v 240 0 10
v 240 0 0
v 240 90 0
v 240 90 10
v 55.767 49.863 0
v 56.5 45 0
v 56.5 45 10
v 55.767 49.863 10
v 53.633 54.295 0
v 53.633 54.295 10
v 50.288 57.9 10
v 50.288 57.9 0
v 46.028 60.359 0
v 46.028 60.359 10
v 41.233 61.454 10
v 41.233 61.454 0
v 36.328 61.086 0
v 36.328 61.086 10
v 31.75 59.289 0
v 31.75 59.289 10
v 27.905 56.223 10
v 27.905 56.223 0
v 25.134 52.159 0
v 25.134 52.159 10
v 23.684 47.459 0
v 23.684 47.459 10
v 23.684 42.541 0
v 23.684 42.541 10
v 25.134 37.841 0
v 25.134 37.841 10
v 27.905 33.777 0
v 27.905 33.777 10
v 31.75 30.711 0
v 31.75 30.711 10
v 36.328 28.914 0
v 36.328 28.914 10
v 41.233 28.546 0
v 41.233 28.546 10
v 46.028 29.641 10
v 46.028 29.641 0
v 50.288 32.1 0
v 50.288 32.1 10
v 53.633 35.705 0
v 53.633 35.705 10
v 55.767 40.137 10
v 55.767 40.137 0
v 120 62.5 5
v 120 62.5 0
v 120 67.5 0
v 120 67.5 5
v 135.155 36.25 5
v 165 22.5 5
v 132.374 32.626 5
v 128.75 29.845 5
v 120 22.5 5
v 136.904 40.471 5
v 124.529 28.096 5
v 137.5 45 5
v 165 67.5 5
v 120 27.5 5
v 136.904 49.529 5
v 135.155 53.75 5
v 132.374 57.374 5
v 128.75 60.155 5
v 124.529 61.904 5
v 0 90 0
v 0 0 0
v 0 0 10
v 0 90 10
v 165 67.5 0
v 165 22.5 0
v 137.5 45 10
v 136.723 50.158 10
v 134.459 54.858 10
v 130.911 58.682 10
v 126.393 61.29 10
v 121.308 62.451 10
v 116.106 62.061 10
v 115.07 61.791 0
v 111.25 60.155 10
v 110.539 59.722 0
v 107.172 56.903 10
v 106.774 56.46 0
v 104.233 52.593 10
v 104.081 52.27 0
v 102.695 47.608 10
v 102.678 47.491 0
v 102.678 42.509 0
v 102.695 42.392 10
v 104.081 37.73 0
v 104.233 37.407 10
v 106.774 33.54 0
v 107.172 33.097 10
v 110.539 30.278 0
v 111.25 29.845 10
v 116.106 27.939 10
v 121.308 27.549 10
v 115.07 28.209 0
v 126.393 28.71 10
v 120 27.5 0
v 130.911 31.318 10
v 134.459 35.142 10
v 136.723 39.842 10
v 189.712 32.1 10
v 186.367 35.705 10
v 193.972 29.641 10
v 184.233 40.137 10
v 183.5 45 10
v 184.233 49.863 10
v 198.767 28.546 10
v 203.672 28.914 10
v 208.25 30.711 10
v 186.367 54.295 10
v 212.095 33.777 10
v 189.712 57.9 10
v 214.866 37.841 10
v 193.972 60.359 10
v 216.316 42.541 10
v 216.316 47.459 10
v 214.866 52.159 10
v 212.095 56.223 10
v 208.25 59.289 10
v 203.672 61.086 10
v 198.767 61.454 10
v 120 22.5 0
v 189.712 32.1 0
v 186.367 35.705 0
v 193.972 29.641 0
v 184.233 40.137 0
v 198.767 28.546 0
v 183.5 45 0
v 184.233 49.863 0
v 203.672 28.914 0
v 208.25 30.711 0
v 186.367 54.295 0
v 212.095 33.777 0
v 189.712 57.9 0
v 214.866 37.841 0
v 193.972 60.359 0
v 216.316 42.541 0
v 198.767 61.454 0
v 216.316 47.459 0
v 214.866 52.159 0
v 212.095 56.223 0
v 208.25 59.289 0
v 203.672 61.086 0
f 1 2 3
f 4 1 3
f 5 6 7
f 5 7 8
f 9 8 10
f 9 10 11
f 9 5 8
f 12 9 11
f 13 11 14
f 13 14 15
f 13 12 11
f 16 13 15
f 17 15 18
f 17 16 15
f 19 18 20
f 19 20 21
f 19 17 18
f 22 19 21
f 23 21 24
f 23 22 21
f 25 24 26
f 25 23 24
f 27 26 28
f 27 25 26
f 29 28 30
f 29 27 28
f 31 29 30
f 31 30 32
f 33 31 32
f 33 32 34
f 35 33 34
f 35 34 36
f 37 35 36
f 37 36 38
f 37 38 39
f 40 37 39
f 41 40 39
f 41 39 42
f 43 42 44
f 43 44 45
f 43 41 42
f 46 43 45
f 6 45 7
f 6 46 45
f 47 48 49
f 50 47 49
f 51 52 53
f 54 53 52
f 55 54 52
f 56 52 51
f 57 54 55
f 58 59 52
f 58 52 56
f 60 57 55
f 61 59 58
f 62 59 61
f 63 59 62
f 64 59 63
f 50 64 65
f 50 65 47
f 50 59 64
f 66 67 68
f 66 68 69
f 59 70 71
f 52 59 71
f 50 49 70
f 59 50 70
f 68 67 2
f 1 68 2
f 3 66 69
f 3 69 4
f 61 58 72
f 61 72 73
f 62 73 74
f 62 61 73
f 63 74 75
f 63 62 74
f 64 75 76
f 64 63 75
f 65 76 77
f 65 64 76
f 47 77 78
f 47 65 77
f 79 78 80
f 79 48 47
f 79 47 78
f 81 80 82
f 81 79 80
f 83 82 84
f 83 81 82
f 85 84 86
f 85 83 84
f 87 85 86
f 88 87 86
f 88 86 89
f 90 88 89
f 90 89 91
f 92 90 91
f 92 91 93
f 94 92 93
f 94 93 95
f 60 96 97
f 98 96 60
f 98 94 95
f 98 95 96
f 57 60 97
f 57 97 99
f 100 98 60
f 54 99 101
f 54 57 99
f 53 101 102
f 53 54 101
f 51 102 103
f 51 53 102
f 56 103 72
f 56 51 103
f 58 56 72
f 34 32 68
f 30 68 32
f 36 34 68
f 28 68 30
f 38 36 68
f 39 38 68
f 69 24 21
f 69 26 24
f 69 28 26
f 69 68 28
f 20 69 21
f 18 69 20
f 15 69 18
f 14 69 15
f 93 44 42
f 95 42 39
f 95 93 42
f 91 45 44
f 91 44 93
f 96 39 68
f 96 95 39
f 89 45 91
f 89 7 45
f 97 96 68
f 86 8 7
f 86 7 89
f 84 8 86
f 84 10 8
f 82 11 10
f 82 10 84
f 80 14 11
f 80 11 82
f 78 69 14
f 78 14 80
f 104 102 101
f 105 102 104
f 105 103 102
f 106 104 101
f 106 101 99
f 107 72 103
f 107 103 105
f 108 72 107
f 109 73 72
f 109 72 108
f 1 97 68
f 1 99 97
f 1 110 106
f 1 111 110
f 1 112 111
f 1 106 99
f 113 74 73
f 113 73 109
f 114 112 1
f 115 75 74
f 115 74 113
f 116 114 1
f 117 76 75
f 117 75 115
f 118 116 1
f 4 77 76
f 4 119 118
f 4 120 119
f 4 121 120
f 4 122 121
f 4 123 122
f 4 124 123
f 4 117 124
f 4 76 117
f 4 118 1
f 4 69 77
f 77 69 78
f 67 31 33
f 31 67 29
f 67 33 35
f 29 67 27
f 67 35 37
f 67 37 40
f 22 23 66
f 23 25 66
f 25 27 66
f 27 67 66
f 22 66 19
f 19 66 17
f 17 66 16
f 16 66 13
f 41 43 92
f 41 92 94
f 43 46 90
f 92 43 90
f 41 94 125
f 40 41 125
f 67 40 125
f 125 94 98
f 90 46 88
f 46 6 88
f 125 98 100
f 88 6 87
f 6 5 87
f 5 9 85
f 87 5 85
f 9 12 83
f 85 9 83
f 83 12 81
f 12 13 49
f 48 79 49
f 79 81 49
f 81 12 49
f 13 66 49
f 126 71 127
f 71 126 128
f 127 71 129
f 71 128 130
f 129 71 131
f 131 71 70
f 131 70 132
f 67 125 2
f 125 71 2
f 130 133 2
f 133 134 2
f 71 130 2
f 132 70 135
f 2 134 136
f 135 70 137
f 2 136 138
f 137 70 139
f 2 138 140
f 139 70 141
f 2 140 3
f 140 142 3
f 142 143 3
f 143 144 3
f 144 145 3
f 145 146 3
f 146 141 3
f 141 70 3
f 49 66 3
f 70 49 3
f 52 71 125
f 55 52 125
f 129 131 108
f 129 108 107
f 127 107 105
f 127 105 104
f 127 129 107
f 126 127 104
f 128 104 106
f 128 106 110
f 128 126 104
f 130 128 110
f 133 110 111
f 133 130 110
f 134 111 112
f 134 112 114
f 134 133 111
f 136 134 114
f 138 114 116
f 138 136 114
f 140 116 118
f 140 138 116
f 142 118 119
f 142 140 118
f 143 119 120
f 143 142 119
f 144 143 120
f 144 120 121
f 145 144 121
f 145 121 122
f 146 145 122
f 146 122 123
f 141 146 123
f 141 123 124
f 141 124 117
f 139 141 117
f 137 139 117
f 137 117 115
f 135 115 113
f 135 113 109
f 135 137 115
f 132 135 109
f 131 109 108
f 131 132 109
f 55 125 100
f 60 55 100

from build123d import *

# Parameters (mm, degrees)
CROQUIS1_W              = 240
CROQUIS1_H              = 90
CROQUIS1_R              = 17.5
CROQUIS1_R_2            = 16.5
SALIENTE_EXTRUIR1_DEPTH = 10
CORTAR_EXTRUIR1_DEPTH   = 5


with BuildPart() as part:
    # Croquis1 → Saliente-Extruir1 (new body)
    with BuildSketch(Plane.XY):
        with Locations((120, 45)):
            Rectangle(CROQUIS1_W, CROQUIS1_H)
        with Locations((120, 45)):
            Circle(CROQUIS1_R, mode=Mode.SUBTRACT)
        with Locations((40, 45)):
            Circle(CROQUIS1_R_2, mode=Mode.SUBTRACT)
        with Locations(Location((200, 45, 0), (0, 0, 180))):
            Circle(CROQUIS1_R_2, mode=Mode.SUBTRACT)
    extrude(amount=SALIENTE_EXTRUIR1_DEPTH)

    # Croquis2 → Cortar-Extruir1 (cut)
    with BuildSketch(Plane(origin=(0, 0, 0), x_dir=(-1, 0, 0), z_dir=(0, 0, -1))):
        with BuildLine():
            Line((-120, 62.5), (-120, 67.5))
            Line((-120, 67.5), (-165, 67.5))
            Line((-165, 67.5), (-165, 22.5))
            Line((-165, 22.5), (-120, 22.5))
            Line((-120, 22.5), (-120, 27.5))
            ThreePointArc((-120, 27.5), (-137.5, 45), (-120, 62.5))
        make_face()
    extrude(amount=-CORTAR_EXTRUIR1_DEPTH, mode=Mode.SUBTRACT)


solid = part.part
